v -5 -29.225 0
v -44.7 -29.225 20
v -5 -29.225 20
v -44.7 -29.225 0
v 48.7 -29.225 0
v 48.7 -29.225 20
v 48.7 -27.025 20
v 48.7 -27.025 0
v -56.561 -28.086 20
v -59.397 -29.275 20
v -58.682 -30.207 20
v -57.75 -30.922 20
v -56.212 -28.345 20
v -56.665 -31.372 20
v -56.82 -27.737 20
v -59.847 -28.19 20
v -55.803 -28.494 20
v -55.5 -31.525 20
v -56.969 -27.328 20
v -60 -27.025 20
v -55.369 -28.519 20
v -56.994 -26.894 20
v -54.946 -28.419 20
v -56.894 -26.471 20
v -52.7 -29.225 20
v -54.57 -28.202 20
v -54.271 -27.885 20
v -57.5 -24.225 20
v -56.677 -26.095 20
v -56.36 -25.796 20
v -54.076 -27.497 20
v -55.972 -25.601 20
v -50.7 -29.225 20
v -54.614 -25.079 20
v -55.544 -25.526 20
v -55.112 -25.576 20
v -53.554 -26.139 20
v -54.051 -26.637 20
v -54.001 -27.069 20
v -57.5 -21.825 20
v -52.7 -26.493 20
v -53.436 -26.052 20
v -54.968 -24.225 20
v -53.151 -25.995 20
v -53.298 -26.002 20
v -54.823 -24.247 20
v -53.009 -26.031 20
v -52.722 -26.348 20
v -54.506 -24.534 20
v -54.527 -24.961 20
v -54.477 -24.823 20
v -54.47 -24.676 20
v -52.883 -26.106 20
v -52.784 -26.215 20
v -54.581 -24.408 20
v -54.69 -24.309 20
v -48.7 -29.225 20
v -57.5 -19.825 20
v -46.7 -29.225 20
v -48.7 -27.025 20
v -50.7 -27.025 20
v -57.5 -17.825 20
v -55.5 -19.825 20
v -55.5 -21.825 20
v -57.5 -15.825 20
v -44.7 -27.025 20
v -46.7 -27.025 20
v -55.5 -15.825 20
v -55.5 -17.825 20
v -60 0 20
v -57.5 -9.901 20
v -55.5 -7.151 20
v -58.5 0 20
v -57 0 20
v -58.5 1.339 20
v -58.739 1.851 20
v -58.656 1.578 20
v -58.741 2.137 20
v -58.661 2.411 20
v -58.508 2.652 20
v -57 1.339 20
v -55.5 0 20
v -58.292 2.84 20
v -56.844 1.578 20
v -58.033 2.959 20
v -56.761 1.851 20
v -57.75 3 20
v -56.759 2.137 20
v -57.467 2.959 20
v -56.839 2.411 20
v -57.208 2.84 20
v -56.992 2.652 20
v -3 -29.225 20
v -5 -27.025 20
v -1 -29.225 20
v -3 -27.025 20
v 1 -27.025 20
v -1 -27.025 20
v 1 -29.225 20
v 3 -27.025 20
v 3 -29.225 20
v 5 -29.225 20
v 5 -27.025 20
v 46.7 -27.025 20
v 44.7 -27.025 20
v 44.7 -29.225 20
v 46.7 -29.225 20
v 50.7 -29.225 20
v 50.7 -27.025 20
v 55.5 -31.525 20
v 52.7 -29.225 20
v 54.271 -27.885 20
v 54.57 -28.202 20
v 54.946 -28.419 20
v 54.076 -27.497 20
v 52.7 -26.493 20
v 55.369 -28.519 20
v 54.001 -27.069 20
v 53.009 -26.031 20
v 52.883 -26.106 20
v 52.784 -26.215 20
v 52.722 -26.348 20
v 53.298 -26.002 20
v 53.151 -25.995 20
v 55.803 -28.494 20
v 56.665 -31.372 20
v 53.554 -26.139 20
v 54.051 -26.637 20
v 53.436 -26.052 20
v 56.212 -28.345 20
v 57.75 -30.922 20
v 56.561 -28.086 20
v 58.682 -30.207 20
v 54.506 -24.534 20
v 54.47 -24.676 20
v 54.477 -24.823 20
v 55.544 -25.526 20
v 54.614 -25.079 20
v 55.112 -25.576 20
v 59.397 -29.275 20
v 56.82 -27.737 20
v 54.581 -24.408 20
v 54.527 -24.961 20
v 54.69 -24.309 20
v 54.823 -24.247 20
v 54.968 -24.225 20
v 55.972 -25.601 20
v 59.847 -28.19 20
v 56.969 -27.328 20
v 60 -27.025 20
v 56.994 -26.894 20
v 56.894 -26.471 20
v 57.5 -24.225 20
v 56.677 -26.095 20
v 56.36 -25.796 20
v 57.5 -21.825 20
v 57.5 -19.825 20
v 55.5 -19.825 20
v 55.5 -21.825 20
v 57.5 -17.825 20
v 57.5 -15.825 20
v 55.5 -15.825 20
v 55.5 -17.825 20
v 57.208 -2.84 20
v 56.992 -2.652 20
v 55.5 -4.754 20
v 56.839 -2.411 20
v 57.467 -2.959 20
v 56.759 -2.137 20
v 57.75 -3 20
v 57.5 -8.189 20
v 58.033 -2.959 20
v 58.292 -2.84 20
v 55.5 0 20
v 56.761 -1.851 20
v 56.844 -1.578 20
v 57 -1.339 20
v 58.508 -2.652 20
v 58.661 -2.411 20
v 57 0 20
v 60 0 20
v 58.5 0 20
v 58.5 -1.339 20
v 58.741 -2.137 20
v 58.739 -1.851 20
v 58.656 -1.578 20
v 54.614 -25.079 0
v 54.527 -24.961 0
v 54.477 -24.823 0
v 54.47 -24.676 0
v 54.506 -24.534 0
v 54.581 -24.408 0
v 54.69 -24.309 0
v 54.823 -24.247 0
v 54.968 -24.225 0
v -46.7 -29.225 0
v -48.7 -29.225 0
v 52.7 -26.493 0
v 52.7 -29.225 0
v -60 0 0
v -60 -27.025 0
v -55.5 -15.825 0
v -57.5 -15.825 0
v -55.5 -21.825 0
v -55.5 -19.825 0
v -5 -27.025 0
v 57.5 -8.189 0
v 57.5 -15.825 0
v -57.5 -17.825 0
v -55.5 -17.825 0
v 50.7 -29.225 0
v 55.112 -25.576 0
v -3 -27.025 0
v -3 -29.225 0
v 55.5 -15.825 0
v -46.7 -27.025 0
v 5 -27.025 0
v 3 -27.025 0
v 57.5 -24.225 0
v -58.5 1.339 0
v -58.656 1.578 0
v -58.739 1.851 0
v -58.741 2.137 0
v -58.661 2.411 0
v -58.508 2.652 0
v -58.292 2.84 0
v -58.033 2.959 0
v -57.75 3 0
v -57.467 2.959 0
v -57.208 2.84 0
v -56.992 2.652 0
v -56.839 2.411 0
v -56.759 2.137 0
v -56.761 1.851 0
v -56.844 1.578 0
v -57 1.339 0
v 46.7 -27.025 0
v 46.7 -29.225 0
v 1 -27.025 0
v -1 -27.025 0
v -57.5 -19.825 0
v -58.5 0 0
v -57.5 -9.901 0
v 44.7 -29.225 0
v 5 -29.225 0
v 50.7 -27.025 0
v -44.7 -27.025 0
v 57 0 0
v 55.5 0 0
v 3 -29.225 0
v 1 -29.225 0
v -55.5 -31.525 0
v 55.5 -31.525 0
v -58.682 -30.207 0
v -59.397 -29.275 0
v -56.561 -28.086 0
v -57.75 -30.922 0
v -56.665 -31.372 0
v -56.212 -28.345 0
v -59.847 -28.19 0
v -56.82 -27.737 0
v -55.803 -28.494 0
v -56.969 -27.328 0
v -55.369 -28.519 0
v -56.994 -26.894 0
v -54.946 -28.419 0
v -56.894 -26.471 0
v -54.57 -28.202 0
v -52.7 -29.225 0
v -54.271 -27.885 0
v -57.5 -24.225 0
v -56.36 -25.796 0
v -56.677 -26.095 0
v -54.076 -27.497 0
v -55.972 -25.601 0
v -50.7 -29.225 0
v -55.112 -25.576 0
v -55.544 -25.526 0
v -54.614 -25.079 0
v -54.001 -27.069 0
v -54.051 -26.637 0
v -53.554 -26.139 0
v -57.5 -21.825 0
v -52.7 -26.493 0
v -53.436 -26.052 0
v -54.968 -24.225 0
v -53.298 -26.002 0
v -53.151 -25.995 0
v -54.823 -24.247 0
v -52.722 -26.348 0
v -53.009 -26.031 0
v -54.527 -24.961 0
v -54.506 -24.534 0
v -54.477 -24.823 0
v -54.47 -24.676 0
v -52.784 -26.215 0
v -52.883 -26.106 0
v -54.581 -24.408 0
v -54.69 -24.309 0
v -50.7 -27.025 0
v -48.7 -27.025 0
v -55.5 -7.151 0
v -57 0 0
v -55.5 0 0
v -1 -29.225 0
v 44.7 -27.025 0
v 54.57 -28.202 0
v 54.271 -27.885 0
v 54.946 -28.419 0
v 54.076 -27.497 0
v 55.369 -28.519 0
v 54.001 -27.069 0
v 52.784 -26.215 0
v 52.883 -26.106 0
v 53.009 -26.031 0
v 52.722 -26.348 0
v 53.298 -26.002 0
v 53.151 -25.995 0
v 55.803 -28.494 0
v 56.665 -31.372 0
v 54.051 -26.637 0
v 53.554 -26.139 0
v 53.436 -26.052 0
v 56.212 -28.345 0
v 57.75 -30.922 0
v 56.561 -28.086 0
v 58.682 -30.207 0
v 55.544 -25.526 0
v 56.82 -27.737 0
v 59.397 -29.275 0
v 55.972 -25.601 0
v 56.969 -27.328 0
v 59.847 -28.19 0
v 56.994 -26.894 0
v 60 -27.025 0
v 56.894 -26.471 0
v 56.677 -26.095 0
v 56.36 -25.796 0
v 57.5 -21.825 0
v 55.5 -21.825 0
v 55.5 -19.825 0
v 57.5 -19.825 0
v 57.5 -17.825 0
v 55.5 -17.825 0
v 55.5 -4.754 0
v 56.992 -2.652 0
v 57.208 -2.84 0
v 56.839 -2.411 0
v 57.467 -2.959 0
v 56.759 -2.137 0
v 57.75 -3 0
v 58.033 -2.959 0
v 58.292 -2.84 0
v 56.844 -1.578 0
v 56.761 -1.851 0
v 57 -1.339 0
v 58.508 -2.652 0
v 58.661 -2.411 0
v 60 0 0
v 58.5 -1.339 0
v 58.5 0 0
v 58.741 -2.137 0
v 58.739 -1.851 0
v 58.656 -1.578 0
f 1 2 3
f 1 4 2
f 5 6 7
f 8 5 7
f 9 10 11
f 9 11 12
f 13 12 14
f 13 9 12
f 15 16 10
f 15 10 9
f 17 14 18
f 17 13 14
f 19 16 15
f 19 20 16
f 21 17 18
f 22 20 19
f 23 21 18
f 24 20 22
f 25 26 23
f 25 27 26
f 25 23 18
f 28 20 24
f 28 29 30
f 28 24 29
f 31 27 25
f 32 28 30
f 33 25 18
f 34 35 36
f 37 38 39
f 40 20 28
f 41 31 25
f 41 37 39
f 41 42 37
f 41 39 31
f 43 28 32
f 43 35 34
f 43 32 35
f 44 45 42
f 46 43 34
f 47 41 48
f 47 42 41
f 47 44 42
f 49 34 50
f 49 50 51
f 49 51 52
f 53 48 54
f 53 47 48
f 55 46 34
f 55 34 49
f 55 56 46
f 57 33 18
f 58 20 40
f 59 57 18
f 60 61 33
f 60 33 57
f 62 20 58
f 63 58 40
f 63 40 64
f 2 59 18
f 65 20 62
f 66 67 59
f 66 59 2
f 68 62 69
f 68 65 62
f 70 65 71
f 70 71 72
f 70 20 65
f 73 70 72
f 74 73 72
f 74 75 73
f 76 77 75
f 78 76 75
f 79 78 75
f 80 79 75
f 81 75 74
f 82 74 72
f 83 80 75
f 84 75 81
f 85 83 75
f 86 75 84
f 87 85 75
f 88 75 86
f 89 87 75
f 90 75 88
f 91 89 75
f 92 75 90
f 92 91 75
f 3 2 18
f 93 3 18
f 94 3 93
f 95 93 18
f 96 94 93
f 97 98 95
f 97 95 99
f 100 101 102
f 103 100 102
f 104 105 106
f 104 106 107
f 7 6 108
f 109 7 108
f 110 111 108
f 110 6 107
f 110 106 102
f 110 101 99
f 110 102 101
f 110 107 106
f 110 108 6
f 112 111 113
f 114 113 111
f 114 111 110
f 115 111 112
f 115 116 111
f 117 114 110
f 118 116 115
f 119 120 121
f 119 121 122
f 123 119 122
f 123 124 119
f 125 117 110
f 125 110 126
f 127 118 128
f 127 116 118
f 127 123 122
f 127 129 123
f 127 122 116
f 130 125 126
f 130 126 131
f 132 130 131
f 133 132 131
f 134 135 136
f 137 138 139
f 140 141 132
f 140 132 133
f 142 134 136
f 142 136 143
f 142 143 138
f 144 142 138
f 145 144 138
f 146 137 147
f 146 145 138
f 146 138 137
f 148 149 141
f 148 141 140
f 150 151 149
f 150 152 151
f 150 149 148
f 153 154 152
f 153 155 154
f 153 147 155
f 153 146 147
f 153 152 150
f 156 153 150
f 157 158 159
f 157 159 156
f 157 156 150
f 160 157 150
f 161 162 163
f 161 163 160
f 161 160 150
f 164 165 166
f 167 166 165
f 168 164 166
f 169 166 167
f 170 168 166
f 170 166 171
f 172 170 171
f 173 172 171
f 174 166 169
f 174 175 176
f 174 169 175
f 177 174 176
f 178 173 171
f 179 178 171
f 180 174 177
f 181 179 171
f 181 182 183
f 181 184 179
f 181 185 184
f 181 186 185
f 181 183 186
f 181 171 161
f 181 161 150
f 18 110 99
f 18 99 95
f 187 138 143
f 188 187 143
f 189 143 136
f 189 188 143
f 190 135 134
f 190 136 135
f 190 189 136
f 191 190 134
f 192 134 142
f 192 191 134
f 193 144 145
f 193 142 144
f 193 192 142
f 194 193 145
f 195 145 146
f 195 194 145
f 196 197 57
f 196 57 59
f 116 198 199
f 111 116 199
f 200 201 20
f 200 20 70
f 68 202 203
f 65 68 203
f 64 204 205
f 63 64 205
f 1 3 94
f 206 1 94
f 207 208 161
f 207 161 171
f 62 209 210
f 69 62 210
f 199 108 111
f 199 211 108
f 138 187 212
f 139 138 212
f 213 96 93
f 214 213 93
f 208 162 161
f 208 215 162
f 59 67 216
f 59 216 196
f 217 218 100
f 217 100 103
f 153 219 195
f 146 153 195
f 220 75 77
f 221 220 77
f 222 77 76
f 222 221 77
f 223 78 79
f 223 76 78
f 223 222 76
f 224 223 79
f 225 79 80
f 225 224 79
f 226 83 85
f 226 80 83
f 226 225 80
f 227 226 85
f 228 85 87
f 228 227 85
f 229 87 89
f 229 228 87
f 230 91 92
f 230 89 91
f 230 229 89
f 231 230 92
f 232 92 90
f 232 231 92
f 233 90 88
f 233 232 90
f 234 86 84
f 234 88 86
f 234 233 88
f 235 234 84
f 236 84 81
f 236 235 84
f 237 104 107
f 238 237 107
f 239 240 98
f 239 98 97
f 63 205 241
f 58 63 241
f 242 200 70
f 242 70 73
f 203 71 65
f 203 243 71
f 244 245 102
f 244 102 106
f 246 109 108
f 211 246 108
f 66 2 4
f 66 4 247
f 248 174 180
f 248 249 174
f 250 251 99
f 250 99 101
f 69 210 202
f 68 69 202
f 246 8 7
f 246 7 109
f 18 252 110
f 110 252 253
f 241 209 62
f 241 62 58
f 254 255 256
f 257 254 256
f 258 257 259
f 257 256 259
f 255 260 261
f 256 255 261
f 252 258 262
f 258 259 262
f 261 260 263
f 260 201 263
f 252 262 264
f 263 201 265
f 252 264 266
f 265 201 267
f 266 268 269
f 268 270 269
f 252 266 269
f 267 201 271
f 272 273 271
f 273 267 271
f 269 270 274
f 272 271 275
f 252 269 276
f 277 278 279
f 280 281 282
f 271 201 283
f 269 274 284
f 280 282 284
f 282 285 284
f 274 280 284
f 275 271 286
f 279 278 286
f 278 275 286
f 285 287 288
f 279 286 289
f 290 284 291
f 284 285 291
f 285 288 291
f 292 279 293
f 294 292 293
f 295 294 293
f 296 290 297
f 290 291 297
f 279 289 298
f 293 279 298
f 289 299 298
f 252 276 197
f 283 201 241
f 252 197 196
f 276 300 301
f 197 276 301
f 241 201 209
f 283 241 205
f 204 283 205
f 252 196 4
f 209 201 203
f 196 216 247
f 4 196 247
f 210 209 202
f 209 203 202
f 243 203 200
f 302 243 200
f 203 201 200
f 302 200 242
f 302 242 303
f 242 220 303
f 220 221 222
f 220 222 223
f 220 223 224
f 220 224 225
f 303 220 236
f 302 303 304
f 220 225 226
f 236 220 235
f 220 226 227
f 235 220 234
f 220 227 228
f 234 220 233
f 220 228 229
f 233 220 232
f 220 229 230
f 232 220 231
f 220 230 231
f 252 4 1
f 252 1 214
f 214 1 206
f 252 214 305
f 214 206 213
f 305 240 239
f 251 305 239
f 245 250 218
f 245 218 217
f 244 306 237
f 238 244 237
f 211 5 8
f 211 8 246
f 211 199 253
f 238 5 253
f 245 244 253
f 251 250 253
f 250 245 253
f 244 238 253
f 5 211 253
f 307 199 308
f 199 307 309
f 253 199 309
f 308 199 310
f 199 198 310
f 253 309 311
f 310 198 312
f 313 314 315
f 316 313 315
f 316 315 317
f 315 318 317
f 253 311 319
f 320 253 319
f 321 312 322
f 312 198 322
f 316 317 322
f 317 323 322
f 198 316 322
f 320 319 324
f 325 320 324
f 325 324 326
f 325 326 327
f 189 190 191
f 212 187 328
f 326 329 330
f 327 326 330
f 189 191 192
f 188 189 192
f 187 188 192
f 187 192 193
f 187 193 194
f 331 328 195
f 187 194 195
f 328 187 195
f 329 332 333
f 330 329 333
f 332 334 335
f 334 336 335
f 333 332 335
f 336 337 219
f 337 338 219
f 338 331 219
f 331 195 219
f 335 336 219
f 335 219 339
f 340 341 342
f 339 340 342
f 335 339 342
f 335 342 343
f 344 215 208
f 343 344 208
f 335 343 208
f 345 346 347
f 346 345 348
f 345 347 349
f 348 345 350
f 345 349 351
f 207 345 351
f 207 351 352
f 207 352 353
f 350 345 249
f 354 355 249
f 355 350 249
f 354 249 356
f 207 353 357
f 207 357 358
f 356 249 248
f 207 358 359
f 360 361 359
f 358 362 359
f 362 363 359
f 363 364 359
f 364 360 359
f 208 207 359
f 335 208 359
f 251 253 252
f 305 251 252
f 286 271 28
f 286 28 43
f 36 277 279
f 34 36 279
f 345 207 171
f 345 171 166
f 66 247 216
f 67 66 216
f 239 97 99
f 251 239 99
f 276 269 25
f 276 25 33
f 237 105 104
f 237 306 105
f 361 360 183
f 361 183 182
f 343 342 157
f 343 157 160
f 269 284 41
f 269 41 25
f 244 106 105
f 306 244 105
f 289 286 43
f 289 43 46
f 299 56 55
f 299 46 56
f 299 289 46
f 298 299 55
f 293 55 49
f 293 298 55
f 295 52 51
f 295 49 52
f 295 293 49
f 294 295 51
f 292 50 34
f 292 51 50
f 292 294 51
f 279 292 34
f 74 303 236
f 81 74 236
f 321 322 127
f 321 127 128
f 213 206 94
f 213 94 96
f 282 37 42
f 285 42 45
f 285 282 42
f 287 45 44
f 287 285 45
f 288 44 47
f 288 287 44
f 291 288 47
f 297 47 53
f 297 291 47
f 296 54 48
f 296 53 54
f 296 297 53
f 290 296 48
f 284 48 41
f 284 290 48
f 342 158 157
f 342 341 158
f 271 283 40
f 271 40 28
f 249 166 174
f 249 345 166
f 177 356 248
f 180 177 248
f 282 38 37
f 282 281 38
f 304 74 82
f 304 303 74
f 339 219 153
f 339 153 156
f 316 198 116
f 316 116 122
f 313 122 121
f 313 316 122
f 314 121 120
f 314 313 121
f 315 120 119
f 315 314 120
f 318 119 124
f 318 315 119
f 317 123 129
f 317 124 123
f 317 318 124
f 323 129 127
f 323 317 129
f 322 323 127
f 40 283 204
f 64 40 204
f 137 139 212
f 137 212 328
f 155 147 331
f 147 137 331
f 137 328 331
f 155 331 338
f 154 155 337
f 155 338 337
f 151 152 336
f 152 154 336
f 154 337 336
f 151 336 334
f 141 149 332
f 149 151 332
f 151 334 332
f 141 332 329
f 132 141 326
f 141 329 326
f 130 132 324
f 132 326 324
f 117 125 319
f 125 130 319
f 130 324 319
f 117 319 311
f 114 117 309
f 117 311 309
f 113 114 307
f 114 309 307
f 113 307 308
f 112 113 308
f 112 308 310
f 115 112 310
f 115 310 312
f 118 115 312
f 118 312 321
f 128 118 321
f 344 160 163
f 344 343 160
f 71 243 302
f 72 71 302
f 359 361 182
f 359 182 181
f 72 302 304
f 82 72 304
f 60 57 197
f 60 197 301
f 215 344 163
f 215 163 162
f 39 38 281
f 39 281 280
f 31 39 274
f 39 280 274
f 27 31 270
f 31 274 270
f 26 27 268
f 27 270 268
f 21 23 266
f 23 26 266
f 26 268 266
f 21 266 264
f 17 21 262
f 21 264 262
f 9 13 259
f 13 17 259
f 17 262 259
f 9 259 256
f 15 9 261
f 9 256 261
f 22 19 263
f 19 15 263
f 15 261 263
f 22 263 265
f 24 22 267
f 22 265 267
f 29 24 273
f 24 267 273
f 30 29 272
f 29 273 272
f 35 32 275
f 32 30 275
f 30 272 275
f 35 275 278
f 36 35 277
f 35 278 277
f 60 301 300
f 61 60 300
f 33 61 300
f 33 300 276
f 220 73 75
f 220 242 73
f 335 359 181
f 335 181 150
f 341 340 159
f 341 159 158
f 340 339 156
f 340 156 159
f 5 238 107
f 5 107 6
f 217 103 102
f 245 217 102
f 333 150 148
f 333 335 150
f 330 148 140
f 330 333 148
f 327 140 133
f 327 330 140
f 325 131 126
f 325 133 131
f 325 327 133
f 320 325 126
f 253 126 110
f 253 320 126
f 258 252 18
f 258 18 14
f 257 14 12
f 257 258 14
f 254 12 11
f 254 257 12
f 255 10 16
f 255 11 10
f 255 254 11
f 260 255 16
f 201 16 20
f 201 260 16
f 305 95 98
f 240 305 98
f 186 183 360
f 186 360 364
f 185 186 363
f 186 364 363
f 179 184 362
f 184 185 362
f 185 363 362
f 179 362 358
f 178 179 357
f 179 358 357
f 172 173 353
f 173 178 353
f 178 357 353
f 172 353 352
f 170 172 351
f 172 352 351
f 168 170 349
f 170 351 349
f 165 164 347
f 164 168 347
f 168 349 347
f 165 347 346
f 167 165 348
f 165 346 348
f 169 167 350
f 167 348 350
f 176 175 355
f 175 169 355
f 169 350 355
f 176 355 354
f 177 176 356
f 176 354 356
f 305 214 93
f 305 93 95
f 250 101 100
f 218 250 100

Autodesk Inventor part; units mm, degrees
ref_plane "YZ Plane" through (0, 0, 0) normal (1, 0, 0) x (0, 1, 0)
ref_plane "XZ Plane" through (0, 0, 0) normal (0, 1, 0) x (-1, 0, 0)
ref_plane "XY Plane" through (0, 0, 0) normal (0, 0, 1) x (1, 0, 0)
sketch "Sketch1" plane through (0, 0, 0) normal (0, 0, 1) x (1, 0, 0)
  line L0 (60, 0) -> (60, -27.025)
  line L1 (-60, -27.025) -> (-60, 0)
  line L2 (0, 54.7321) -> (0, -29.5526) construction
  line L3 (-1, -29.225) -> (-1, -27.025)
  line L4 (-1, -27.025) -> (1, -27.025)
  line L5 (1, -27.025) -> (1, -29.225)
  line L6 (-5, -29.225) -> (-5, -27.025)
  line L7 (-5, -27.025) -> (-3, -27.025)
  line L8 (-3, -27.025) -> (-3, -29.225)
  line L9 (3, -29.225) -> (3, -27.025)
  line L10 (3, -27.025) -> (5, -27.025)
  line L11 (5, -27.025) -> (5, -29.225)
  line L12 (-3, -29.225) -> (-1, -29.225)
  line L13 (1, -29.225) -> (3, -29.225)
  line L14 (-44.7, -29.225) -> (-44.7, -27.025)
  line L15 (-44.7, -27.025) -> (-46.7, -27.025)
  line L16 (-46.7, -27.025) -> (-46.7, -29.225)
  line L17 (-48.7, -29.225) -> (-48.7, -27.025)
  line L18 (-48.7, -27.025) -> (-50.7, -27.025)
  line L19 (-50.7, -27.025) -> (-50.7, -29.225)
  line L20 (-52.7, -29.225) -> (-50.7, -29.225)
  line L21 (-48.7, -29.225) -> (-46.7, -29.225)
  line L22 (-44.7, -29.225) -> (-5, -29.225)
  line L23 (44.7, -29.225) -> (44.7, -27.025)
  line L24 (44.7, -27.025) -> (46.7, -27.025)
  line L25 (46.7, -27.025) -> (46.7, -29.225)
  line L26 (48.7, -29.225) -> (48.7, -27.025)
  line L27 (48.7, -27.025) -> (50.7, -27.025)
  line L28 (50.7, -27.025) -> (50.7, -29.225)
  line L29 (5, -29.225) -> (44.7, -29.225)
  line L30 (46.7, -29.225) -> (48.7, -29.225)
  line L31 (50.7, -29.225) -> (52.7, -29.225)
  line L32 (-55.5, -31.525) -> (55.5, -31.525)
  line L33 (57.5, -21.825) -> (55.5, -21.825)
  line L34 (55.5, -21.825) -> (55.5, -19.825)
  line L35 (55.5, -19.825) -> (57.5, -19.825)
  line L36 (57.5, -17.825) -> (55.5, -17.825)
  line L37 (55.5, -17.825) -> (55.5, -15.825)
  line L38 (55.5, -15.825) -> (57.5, -15.825)
  line L39 (57.5, -24.225) -> (57.5, -21.825)
  line L40 (57.5, -19.825) -> (57.5, -17.825)
  line L41 (57.5, -15.825) -> (57.5, -8.1888)
  line L42 (57.5, -24.225) -> (54.9678, -24.225)
  line L43 (-57.5, -21.825) -> (-55.5, -21.825)
  line L44 (-55.5, -21.825) -> (-55.5, -19.825)
  line L45 (-55.5, -19.825) -> (-57.5, -19.825)
  line L46 (-57.5, -17.825) -> (-55.5, -17.825)
  line L47 (-55.5, -17.825) -> (-55.5, -15.825)
  line L48 (-55.5, -15.825) -> (-57.5, -15.825)
  line L49 (-57.5, -21.825) -> (-57.5, -24.225)
  line L50 (-57.5, -9.9008) -> (-57.5, -15.825)
  line L51 (-57.5, -17.825) -> (-57.5, -19.825)
  arc A0 (-60, -27.025) -> (-55.5, -31.525) centre (-55.5, -27.025) ccw
  arc A1 (55.5, -31.525) -> (60, -27.025) centre (55.5, -27.025) ccw
  arc A2 (54.0511, -26.6368) -> (55.1118, -25.5761) centre (55.5, -27.025) ccw
  arc A3 (-55.1118, -25.5761) -> (-54.0511, -26.6368) centre (-55.5, -27.025) ccw
  line L52 (52.7, -26.4928) -> (52.7, -29.225)
  line L53 (54.6142, -25.0786) -> (55.1118, -25.5761)
  line L54 (53.5536, -26.1392) -> (54.0511, -26.6368)
  line L55 (55.5, -27.025) -> (52.7, -24.225) construction
  arc A4 (54.9678, -24.225) -> (54.6142, -25.0786) centre (54.9678, -24.725) ccw
  arc A5 (53.5536, -26.1392) -> (52.7, -26.4928) centre (53.2, -26.4928) ccw
  line L56 (-57.5, -24.225) -> (-54.9678, -24.225)
  line L57 (-52.7, -26.4928) -> (-52.7, -29.225)
  line L58 (-55.5, -27.025) -> (-52.7, -24.225) construction
  line L59 (-55.1118, -25.5761) -> (-54.6142, -25.0786)
  line L60 (-54.0511, -26.6368) -> (-53.5536, -26.1392)
  arc A6 (-54.6142, -25.0786) -> (-54.9678, -24.225) centre (-54.9678, -24.725) ccw
  arc A7 (-52.7, -26.4928) -> (-53.5536, -26.1392) centre (-53.2, -26.4928) ccw
  line L61 (-57.5, -9.9008) -> (-55.5, -7.1508)
  line L62 (-55.5, -7.1508) -> (-55.5, 0)
  line L63 (57.5, -8.1888) -> (55.5, -4.7544)
  line L64 (55.5, -4.7544) -> (55.5, 0)
  arc A8 (-57, 1.3386) -> (-58.5, 1.3386) centre (-57.75, 2) ccw
  line L65 (-58.5, 0) -> (-58.5, 1.3386)
  line L66 (-57, 0) -> (-57, 1.3386)
  line L67 (-57.75, 1.7435) -> (-57.75, 0.7418) construction
  line L68 (-60, 0) -> (-58.5, 0)
  line L69 (-57, 0) -> (-55.5, 0)
  arc A9 (57, -1.3386) -> (58.5, -1.3386) centre (57.75, -2) ccw
  line L70 (57, -1.3386) -> (57, 0)
  line L71 (58.5, -1.3386) -> (58.5, 0)
  line L72 (57.75, 2.8392) -> (57.75, 0.4457) construction
  line L73 (55.5, 0) -> (57, 0)
  line L74 (58.5, 0) -> (60, 0)
  point P0 (0, 0)
  dimension "d0" = 120
  dimension "d11" = 2
  dimension "d13" = 39.7
  dimension "d14" = 2.3
  dimension "d16" = 4.5
  dimension "d17" = 10
  dimension "d19" = 7.3
  dimension "d20" = 8.4
  dimension "d21" = 115
  dimension "d22" = 111
  dimension "d23" = 9
  dimension "d25" = 3
  dimension "d26" = 7.3
  dimension "d28" = 1.5
  dimension "d29" = 1
  dimension "d31" = 1.5
  dimension "d32" = 2
  dimension "d34" = 1.5
  dimension "d35" = 31.525
  dimension "d36" = 2
  dimension "d37" = 1.5
  dimension "d38" = 2
  dimension "d41" = 111
extrude "Extrusion1" add sketch "Sketch1" along normal blind 20
equation "\"d26\" = d19"
equation "\"d31\" = d28"
equation "\"d36\" = d32"
equation "\"d37\" = d34"
properties part number "SZOMK-AK-C-C10"
